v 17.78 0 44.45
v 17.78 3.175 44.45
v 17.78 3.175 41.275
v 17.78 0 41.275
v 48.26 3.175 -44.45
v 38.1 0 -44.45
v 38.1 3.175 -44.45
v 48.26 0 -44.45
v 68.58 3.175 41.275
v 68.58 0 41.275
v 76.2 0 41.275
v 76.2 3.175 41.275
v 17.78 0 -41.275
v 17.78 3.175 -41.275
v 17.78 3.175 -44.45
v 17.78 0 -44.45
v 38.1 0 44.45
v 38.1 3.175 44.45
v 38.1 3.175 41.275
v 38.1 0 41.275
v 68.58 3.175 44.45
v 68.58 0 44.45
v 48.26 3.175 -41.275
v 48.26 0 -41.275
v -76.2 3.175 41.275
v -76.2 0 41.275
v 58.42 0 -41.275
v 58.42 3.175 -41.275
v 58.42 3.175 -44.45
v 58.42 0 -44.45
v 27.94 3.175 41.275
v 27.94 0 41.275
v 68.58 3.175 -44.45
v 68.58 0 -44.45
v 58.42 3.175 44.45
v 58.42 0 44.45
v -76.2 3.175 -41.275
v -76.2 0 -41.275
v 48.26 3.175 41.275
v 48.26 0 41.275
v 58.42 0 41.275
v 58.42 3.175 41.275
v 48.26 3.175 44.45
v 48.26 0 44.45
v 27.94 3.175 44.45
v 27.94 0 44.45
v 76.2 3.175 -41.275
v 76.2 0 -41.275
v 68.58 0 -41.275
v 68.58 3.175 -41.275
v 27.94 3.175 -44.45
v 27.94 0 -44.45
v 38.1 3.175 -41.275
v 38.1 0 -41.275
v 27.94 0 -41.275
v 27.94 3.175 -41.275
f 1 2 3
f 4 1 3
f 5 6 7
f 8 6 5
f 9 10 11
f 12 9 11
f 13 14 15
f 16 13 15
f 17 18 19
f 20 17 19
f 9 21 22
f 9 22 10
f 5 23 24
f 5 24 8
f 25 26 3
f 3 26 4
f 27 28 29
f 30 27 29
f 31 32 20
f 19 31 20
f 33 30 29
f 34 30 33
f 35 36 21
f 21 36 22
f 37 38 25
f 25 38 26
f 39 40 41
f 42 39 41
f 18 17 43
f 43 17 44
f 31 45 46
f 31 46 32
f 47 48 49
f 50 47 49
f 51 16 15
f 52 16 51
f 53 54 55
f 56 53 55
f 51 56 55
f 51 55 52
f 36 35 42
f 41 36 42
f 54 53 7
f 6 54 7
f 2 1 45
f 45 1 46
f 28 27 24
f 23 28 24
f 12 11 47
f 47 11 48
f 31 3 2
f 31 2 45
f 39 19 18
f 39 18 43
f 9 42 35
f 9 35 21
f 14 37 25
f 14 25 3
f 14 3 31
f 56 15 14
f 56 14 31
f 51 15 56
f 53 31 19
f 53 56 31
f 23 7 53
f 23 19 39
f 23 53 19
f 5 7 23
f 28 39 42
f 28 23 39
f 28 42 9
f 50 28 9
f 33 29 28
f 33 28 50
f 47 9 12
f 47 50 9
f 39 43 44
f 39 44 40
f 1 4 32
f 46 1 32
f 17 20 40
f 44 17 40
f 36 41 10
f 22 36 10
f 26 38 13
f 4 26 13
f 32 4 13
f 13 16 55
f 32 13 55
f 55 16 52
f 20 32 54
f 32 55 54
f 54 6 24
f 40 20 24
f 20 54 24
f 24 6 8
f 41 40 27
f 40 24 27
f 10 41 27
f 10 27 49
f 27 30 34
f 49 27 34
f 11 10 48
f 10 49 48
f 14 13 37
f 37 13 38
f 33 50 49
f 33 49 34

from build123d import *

# Parameters (mm, degrees)
BOSS_EXTRUDE1_DEPTH = 3.175


with BuildPart() as part:
    # Sketch1 → Boss-Extrude1 (new body)
    with BuildSketch(Plane(origin=(0, 0, 0), x_dir=(1, 0, 0), z_dir=(0, 1, 0))):
        Polygon((27.94, -41.275), (38.1, -41.275), (38.1, -44.45), (48.26, -44.45), (48.26, -41.275), (58.42, -41.275), (58.42, -44.45), (68.58, -44.45), (68.58, -41.275), (76.2, -41.275), (76.2, 41.275), (68.58, 41.275), (68.58, 44.45), (58.42, 44.45), (58.42, 41.275), (48.26, 41.275), (48.26, 44.45), (38.1, 44.45), (38.1, 41.275), (27.94, 41.275), (27.94, 44.45), (17.78, 44.45), (17.78, 41.275), (-76.2, 41.275), (-76.2, -41.275), (17.78, -41.275), (17.78, -44.45), (27.94, -44.45), align=None)
    extrude(amount=BOSS_EXTRUDE1_DEPTH)


solid = part.part
